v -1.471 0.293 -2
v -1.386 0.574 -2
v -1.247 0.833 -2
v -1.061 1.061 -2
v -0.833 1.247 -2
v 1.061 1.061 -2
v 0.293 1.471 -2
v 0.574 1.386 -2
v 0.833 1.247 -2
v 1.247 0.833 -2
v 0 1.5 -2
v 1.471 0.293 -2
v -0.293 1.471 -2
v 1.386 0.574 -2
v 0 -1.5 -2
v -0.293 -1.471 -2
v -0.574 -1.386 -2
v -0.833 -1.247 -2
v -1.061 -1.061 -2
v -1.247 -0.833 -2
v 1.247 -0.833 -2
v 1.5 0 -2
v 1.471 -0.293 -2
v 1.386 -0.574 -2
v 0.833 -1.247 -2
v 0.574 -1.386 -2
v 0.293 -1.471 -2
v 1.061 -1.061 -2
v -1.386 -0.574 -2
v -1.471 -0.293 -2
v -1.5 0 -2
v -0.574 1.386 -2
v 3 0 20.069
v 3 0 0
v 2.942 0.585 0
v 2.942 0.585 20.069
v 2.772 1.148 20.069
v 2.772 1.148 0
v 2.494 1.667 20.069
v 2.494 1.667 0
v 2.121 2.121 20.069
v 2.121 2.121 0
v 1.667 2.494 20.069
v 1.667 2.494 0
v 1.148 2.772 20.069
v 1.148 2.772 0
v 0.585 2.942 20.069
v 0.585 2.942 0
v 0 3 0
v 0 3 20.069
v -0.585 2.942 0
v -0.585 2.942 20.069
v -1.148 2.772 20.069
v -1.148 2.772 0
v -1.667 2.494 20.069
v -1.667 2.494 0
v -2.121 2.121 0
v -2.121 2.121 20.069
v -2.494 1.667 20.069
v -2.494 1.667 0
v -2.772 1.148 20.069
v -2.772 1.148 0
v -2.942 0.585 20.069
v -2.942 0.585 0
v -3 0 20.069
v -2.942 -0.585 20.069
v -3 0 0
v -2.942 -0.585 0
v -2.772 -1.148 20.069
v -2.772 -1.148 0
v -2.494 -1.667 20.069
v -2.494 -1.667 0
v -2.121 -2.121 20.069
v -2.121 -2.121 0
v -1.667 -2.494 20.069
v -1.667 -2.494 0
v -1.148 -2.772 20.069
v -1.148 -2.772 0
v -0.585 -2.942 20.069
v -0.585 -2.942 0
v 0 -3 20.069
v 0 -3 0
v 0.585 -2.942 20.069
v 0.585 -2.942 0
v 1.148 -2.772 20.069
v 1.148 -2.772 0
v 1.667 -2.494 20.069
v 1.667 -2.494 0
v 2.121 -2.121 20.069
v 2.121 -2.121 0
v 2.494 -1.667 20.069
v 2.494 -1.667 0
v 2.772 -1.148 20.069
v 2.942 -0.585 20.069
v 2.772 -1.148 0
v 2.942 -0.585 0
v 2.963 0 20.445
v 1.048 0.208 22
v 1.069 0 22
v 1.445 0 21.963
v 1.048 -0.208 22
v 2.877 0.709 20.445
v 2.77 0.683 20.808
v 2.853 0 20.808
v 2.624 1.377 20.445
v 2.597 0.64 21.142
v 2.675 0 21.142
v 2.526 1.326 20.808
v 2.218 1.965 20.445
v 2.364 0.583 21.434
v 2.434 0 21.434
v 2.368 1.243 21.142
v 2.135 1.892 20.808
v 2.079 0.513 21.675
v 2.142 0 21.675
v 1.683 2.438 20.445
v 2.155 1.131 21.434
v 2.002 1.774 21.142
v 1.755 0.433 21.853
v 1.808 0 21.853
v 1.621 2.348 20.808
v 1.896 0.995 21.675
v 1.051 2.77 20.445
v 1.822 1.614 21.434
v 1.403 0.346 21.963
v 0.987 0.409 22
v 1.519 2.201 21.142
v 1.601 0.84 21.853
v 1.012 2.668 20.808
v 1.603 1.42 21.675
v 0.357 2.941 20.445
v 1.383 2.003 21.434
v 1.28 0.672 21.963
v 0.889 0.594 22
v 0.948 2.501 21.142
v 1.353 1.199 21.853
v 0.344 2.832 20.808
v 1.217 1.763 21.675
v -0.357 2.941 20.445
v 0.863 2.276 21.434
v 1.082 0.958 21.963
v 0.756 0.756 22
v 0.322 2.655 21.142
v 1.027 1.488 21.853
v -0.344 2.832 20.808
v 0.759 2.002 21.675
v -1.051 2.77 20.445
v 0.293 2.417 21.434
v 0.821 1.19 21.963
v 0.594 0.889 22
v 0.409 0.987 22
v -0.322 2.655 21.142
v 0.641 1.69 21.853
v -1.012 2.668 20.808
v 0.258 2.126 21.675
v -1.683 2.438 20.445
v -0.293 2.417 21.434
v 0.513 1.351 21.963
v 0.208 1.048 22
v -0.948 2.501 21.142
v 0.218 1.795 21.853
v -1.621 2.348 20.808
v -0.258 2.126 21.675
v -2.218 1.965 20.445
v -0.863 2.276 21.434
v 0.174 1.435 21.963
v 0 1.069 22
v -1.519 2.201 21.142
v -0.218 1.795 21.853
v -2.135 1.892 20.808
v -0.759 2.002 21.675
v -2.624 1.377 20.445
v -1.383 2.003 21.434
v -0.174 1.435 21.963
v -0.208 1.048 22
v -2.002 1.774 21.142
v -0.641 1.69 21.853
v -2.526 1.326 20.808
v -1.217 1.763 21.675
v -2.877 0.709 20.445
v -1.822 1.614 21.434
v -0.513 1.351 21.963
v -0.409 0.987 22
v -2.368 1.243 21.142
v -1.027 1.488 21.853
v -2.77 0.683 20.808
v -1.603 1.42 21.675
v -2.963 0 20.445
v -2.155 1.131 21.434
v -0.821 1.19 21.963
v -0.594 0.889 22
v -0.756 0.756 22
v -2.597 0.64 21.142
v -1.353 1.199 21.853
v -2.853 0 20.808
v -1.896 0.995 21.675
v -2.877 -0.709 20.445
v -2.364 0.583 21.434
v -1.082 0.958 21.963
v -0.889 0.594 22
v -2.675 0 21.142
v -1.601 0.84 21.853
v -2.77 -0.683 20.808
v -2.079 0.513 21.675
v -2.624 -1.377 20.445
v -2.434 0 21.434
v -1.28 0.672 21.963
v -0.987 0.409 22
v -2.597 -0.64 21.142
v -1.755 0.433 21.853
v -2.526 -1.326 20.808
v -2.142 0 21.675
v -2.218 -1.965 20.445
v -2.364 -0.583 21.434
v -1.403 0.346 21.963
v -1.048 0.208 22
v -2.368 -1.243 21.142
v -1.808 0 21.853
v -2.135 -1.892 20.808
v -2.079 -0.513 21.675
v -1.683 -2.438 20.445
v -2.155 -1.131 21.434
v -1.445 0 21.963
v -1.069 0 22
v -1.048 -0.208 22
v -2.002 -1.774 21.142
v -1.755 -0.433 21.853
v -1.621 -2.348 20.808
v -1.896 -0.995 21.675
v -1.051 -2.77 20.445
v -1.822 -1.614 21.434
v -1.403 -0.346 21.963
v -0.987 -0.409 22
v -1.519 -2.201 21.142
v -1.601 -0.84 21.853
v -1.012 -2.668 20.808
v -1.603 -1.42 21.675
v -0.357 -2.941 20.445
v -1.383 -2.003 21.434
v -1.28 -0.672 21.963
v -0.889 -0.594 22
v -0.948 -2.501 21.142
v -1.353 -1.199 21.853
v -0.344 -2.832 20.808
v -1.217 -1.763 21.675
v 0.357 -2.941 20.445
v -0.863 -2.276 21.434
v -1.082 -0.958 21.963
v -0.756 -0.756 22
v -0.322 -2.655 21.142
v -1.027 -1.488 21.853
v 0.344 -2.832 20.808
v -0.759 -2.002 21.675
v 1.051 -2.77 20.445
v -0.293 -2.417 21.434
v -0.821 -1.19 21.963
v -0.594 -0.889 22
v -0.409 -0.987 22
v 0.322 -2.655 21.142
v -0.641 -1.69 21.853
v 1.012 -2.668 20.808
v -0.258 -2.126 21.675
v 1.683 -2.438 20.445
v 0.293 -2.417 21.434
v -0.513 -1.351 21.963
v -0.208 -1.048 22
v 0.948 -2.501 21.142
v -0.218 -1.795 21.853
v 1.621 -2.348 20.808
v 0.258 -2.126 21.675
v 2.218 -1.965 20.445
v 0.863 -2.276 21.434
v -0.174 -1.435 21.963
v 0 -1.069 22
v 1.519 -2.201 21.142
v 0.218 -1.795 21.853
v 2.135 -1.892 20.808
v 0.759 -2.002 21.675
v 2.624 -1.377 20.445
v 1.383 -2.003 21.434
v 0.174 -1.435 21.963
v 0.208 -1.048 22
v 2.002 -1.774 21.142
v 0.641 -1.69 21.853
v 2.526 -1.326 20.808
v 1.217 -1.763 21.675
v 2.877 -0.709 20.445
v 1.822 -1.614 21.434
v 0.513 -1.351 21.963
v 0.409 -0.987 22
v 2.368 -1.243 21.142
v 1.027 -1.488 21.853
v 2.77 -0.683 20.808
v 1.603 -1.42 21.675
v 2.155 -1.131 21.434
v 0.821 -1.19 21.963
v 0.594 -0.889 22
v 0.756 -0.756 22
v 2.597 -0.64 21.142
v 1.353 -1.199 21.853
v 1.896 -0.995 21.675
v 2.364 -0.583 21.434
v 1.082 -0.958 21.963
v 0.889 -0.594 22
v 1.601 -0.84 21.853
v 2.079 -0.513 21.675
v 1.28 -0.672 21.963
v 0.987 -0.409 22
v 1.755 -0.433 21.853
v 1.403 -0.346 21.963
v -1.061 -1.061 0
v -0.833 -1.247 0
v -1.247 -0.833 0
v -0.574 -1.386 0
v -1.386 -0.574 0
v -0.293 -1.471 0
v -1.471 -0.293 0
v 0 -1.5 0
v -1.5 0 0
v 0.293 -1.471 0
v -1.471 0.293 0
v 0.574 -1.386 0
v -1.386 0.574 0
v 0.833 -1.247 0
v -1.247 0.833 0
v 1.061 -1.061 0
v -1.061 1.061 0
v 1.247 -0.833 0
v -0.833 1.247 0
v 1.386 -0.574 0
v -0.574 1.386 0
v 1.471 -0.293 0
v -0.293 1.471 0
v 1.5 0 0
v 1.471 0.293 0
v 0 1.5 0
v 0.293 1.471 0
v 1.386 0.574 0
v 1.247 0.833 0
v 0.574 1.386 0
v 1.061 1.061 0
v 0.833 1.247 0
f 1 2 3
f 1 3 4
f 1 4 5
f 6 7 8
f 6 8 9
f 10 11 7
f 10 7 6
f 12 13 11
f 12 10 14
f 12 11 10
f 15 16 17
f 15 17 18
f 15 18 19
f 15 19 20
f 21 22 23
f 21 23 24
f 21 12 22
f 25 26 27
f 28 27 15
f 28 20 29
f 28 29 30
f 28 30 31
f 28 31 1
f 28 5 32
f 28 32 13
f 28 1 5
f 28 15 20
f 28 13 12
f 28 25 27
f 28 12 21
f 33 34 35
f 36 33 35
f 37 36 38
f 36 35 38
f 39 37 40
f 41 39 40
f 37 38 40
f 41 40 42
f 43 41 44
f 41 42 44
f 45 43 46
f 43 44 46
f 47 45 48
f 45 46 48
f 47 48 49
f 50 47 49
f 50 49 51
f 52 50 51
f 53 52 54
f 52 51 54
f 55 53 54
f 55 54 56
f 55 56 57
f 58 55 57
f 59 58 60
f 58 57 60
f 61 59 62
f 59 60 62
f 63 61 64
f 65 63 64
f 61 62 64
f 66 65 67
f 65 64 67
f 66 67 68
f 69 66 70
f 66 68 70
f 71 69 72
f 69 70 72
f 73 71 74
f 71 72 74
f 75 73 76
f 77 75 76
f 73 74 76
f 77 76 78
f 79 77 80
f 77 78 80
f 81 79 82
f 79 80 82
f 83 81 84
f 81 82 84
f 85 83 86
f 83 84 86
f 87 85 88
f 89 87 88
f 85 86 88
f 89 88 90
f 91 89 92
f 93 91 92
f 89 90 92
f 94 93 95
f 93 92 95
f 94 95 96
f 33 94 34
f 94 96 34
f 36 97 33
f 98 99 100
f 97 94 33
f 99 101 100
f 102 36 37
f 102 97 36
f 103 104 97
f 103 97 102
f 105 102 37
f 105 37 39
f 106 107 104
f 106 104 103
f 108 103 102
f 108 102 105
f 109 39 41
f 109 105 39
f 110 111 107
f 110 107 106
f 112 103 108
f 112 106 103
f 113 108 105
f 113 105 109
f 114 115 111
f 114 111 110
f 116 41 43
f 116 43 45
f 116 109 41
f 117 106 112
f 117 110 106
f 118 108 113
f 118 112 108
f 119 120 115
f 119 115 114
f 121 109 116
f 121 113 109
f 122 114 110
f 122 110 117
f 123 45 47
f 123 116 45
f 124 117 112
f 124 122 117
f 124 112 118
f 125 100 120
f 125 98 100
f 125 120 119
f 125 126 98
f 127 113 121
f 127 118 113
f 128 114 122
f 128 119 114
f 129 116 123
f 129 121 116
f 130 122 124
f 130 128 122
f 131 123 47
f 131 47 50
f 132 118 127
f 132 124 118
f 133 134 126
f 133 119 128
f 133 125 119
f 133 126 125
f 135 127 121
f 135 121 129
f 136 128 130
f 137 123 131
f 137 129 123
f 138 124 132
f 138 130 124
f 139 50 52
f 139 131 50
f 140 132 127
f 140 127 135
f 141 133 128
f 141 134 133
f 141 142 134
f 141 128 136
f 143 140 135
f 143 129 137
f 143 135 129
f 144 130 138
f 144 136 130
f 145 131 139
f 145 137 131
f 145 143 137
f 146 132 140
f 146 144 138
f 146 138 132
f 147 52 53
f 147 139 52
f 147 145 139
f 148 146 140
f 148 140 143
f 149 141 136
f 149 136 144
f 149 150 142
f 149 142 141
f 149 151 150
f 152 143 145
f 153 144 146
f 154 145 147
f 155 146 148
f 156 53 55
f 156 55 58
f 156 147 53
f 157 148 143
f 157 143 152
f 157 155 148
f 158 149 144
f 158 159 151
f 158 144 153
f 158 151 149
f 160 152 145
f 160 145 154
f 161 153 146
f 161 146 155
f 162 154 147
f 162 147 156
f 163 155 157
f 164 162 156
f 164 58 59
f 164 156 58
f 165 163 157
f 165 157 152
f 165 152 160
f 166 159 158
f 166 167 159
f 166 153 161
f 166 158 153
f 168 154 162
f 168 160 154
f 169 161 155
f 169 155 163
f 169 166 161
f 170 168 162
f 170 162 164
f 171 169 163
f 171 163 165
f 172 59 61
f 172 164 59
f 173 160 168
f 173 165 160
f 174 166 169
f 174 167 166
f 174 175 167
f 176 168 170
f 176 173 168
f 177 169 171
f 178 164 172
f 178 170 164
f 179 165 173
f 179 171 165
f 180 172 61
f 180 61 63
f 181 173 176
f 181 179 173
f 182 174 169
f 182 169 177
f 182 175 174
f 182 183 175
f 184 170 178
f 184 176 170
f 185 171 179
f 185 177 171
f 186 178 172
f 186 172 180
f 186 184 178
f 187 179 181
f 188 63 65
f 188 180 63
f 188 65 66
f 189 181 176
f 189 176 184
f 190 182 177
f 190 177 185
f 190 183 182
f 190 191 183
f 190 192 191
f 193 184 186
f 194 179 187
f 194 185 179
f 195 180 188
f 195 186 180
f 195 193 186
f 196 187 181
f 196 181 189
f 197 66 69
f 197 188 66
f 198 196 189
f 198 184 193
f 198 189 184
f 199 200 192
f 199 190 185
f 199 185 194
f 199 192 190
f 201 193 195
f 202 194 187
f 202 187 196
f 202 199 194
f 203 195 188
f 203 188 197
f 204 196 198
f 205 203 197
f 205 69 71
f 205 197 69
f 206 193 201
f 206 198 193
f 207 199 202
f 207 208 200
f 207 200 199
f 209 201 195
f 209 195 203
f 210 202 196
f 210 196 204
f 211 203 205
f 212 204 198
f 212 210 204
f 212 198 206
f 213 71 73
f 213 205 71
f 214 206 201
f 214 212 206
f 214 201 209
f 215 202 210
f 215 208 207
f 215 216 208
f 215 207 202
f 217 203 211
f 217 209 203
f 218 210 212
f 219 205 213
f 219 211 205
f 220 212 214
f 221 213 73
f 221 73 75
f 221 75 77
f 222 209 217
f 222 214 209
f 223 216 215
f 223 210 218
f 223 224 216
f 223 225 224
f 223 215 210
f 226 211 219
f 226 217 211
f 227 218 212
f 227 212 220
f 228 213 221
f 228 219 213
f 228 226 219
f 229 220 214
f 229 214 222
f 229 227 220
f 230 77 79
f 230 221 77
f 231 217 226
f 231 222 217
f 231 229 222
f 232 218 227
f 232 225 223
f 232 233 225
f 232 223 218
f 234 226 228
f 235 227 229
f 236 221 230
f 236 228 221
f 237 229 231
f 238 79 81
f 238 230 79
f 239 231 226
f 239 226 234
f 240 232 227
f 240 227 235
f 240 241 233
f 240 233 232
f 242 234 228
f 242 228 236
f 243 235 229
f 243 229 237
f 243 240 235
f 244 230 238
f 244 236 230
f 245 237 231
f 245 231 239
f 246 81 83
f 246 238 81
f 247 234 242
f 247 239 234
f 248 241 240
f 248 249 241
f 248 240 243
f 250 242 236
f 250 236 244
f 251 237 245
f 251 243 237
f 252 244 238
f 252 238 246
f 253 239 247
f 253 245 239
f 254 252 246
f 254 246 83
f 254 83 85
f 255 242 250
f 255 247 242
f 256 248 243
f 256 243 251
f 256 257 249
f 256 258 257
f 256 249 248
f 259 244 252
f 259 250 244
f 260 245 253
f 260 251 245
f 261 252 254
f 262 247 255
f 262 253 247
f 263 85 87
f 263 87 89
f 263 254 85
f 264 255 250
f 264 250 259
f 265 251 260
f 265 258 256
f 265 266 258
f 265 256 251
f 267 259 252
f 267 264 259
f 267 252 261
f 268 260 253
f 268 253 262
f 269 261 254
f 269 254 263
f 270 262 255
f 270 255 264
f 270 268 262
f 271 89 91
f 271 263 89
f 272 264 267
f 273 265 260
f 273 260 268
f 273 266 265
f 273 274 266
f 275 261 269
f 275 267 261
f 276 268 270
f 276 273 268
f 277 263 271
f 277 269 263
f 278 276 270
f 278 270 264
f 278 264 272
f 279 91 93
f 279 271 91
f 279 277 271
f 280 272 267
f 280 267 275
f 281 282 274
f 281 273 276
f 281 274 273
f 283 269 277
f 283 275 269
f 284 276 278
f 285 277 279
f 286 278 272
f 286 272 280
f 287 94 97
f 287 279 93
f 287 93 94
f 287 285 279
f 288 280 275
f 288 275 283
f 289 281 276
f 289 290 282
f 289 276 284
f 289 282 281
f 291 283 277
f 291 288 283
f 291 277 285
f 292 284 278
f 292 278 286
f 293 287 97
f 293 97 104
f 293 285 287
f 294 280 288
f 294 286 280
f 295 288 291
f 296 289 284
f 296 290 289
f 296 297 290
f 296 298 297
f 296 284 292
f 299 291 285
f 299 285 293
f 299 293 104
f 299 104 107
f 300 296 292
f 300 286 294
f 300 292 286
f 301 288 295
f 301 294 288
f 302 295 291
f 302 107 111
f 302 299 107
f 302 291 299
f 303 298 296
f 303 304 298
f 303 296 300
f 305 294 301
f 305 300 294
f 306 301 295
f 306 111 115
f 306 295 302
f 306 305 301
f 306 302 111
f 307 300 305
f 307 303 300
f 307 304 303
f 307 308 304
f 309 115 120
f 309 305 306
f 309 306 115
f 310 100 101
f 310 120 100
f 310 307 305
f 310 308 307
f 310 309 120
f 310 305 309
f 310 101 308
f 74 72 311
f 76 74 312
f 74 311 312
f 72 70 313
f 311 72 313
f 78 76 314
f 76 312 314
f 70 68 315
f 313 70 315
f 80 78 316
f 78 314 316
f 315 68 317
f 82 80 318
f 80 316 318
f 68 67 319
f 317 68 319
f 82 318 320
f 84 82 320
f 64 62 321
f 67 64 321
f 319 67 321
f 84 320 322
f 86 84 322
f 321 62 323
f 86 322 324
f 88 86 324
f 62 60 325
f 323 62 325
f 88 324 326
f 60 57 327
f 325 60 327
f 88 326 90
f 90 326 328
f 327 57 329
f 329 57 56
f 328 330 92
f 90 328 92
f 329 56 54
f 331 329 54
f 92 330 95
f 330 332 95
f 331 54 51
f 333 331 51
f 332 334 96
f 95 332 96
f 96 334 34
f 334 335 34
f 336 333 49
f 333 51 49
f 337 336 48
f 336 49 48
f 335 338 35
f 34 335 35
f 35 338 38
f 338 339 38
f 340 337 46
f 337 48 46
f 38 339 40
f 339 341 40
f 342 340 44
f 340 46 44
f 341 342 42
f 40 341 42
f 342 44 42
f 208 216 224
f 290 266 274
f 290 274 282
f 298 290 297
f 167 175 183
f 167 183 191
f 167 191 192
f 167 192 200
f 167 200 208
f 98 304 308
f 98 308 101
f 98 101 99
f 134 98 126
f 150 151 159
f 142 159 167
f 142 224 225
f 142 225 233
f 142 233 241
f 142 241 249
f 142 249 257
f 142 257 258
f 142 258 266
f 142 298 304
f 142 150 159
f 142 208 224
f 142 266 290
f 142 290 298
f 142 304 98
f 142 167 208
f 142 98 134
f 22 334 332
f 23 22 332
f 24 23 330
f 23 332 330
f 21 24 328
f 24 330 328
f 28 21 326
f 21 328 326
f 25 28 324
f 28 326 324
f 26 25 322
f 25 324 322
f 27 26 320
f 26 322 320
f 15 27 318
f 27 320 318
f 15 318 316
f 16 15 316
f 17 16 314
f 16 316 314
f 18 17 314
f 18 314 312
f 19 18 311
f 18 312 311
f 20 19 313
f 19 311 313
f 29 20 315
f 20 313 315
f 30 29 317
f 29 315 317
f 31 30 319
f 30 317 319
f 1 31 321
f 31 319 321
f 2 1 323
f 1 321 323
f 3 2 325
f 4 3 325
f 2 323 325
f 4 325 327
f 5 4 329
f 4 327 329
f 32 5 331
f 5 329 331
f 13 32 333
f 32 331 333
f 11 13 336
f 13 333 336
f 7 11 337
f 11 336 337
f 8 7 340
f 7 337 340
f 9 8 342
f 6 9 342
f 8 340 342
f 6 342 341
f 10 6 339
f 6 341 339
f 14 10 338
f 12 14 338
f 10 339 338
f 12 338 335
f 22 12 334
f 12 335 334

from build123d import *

# Parameters (mm, degrees)
F0_R     = 3
F1_DEPTH = 22
F2_R     = 1.931371
F3_R     = 1.5
F4_DEPTH = 2


with BuildPart() as f1:
    # F0 (on Top) → F1 (new body)
    with BuildSketch(Plane.XY):
        Circle(F0_R)
    extrude(amount=F1_DEPTH)

    # F2
    f2_edges = [f1.edges().sort_by_distance(p)[0] for p in [
        (-3, 0, 22),
    ]]
    fillet(f2_edges, radius=F2_R)

    # F3 (on face) → F4 (join)
    with BuildSketch(Plane(origin=(0, 0, 0), x_dir=(1, 0, 0), z_dir=(0, 0, -1))):
        Circle(F3_R)
    extrude(amount=F4_DEPTH)


solid = f1.part
